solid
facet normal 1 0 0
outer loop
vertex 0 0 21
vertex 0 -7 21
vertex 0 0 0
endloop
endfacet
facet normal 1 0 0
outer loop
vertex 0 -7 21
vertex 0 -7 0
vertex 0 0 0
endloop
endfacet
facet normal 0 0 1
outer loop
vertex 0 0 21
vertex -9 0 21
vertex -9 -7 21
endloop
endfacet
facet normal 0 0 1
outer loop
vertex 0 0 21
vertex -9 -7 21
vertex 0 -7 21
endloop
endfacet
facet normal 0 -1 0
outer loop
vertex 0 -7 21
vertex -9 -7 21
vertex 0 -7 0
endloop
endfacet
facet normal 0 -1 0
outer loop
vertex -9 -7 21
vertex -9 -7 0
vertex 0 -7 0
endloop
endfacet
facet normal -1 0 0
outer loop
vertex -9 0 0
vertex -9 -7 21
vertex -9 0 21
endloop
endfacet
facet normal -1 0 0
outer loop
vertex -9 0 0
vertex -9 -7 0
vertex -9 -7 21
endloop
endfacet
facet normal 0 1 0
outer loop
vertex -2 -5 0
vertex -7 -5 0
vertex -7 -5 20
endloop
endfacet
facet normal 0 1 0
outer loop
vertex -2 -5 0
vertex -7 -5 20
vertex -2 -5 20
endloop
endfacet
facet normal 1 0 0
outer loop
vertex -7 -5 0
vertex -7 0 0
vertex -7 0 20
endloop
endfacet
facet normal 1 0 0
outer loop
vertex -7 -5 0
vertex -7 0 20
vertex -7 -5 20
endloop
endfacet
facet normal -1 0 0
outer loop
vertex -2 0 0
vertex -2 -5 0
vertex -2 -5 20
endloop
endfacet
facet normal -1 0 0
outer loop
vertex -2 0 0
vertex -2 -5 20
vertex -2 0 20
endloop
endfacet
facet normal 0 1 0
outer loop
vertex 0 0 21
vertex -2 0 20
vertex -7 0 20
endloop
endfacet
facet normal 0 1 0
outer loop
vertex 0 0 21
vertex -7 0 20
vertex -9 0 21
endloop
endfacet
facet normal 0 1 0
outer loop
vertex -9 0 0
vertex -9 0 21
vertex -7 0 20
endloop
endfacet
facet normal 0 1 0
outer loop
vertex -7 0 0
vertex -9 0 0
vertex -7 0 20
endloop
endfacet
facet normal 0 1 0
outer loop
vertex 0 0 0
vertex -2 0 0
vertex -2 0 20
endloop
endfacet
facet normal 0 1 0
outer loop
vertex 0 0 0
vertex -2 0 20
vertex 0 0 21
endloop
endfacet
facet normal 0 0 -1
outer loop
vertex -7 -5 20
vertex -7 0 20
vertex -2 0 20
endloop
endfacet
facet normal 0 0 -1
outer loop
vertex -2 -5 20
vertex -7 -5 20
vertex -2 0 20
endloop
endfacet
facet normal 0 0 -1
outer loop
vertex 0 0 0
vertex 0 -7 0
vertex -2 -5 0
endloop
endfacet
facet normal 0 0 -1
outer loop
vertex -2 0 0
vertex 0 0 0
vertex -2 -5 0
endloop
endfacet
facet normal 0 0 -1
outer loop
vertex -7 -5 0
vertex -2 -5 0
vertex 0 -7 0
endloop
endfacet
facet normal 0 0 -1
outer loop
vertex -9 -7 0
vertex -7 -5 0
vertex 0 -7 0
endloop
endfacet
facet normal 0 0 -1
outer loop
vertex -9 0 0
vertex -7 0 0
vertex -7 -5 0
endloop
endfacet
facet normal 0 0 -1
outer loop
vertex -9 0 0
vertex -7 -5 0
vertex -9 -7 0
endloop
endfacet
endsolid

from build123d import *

# Parameters (mm, degrees)
BOSS_EXTRUDE1_DEPTH = 20
SKETCH3_W           = 9
SKETCH3_H           = 7
BOSS_EXTRUDE2_DEPTH = 1


with BuildPart() as part:
    # Sketch1 → Boss-Extrude1 (new body)
    with BuildSketch(Plane.XY):
        Polygon((0, 0), (0, -7), (-9, -7), (-9, 0), (-7, 0), (-7, -5), (-2, -5), (-2, 0), align=None)
    extrude(amount=BOSS_EXTRUDE1_DEPTH)

    # Sketch3 → Boss-Extrude2 (add)
    with BuildSketch(Plane.XY.offset(20)):
        with Locations((-4.5, -3.5)):
            Rectangle(SKETCH3_W, SKETCH3_H)
    extrude(amount=BOSS_EXTRUDE2_DEPTH)


solid = part.part
